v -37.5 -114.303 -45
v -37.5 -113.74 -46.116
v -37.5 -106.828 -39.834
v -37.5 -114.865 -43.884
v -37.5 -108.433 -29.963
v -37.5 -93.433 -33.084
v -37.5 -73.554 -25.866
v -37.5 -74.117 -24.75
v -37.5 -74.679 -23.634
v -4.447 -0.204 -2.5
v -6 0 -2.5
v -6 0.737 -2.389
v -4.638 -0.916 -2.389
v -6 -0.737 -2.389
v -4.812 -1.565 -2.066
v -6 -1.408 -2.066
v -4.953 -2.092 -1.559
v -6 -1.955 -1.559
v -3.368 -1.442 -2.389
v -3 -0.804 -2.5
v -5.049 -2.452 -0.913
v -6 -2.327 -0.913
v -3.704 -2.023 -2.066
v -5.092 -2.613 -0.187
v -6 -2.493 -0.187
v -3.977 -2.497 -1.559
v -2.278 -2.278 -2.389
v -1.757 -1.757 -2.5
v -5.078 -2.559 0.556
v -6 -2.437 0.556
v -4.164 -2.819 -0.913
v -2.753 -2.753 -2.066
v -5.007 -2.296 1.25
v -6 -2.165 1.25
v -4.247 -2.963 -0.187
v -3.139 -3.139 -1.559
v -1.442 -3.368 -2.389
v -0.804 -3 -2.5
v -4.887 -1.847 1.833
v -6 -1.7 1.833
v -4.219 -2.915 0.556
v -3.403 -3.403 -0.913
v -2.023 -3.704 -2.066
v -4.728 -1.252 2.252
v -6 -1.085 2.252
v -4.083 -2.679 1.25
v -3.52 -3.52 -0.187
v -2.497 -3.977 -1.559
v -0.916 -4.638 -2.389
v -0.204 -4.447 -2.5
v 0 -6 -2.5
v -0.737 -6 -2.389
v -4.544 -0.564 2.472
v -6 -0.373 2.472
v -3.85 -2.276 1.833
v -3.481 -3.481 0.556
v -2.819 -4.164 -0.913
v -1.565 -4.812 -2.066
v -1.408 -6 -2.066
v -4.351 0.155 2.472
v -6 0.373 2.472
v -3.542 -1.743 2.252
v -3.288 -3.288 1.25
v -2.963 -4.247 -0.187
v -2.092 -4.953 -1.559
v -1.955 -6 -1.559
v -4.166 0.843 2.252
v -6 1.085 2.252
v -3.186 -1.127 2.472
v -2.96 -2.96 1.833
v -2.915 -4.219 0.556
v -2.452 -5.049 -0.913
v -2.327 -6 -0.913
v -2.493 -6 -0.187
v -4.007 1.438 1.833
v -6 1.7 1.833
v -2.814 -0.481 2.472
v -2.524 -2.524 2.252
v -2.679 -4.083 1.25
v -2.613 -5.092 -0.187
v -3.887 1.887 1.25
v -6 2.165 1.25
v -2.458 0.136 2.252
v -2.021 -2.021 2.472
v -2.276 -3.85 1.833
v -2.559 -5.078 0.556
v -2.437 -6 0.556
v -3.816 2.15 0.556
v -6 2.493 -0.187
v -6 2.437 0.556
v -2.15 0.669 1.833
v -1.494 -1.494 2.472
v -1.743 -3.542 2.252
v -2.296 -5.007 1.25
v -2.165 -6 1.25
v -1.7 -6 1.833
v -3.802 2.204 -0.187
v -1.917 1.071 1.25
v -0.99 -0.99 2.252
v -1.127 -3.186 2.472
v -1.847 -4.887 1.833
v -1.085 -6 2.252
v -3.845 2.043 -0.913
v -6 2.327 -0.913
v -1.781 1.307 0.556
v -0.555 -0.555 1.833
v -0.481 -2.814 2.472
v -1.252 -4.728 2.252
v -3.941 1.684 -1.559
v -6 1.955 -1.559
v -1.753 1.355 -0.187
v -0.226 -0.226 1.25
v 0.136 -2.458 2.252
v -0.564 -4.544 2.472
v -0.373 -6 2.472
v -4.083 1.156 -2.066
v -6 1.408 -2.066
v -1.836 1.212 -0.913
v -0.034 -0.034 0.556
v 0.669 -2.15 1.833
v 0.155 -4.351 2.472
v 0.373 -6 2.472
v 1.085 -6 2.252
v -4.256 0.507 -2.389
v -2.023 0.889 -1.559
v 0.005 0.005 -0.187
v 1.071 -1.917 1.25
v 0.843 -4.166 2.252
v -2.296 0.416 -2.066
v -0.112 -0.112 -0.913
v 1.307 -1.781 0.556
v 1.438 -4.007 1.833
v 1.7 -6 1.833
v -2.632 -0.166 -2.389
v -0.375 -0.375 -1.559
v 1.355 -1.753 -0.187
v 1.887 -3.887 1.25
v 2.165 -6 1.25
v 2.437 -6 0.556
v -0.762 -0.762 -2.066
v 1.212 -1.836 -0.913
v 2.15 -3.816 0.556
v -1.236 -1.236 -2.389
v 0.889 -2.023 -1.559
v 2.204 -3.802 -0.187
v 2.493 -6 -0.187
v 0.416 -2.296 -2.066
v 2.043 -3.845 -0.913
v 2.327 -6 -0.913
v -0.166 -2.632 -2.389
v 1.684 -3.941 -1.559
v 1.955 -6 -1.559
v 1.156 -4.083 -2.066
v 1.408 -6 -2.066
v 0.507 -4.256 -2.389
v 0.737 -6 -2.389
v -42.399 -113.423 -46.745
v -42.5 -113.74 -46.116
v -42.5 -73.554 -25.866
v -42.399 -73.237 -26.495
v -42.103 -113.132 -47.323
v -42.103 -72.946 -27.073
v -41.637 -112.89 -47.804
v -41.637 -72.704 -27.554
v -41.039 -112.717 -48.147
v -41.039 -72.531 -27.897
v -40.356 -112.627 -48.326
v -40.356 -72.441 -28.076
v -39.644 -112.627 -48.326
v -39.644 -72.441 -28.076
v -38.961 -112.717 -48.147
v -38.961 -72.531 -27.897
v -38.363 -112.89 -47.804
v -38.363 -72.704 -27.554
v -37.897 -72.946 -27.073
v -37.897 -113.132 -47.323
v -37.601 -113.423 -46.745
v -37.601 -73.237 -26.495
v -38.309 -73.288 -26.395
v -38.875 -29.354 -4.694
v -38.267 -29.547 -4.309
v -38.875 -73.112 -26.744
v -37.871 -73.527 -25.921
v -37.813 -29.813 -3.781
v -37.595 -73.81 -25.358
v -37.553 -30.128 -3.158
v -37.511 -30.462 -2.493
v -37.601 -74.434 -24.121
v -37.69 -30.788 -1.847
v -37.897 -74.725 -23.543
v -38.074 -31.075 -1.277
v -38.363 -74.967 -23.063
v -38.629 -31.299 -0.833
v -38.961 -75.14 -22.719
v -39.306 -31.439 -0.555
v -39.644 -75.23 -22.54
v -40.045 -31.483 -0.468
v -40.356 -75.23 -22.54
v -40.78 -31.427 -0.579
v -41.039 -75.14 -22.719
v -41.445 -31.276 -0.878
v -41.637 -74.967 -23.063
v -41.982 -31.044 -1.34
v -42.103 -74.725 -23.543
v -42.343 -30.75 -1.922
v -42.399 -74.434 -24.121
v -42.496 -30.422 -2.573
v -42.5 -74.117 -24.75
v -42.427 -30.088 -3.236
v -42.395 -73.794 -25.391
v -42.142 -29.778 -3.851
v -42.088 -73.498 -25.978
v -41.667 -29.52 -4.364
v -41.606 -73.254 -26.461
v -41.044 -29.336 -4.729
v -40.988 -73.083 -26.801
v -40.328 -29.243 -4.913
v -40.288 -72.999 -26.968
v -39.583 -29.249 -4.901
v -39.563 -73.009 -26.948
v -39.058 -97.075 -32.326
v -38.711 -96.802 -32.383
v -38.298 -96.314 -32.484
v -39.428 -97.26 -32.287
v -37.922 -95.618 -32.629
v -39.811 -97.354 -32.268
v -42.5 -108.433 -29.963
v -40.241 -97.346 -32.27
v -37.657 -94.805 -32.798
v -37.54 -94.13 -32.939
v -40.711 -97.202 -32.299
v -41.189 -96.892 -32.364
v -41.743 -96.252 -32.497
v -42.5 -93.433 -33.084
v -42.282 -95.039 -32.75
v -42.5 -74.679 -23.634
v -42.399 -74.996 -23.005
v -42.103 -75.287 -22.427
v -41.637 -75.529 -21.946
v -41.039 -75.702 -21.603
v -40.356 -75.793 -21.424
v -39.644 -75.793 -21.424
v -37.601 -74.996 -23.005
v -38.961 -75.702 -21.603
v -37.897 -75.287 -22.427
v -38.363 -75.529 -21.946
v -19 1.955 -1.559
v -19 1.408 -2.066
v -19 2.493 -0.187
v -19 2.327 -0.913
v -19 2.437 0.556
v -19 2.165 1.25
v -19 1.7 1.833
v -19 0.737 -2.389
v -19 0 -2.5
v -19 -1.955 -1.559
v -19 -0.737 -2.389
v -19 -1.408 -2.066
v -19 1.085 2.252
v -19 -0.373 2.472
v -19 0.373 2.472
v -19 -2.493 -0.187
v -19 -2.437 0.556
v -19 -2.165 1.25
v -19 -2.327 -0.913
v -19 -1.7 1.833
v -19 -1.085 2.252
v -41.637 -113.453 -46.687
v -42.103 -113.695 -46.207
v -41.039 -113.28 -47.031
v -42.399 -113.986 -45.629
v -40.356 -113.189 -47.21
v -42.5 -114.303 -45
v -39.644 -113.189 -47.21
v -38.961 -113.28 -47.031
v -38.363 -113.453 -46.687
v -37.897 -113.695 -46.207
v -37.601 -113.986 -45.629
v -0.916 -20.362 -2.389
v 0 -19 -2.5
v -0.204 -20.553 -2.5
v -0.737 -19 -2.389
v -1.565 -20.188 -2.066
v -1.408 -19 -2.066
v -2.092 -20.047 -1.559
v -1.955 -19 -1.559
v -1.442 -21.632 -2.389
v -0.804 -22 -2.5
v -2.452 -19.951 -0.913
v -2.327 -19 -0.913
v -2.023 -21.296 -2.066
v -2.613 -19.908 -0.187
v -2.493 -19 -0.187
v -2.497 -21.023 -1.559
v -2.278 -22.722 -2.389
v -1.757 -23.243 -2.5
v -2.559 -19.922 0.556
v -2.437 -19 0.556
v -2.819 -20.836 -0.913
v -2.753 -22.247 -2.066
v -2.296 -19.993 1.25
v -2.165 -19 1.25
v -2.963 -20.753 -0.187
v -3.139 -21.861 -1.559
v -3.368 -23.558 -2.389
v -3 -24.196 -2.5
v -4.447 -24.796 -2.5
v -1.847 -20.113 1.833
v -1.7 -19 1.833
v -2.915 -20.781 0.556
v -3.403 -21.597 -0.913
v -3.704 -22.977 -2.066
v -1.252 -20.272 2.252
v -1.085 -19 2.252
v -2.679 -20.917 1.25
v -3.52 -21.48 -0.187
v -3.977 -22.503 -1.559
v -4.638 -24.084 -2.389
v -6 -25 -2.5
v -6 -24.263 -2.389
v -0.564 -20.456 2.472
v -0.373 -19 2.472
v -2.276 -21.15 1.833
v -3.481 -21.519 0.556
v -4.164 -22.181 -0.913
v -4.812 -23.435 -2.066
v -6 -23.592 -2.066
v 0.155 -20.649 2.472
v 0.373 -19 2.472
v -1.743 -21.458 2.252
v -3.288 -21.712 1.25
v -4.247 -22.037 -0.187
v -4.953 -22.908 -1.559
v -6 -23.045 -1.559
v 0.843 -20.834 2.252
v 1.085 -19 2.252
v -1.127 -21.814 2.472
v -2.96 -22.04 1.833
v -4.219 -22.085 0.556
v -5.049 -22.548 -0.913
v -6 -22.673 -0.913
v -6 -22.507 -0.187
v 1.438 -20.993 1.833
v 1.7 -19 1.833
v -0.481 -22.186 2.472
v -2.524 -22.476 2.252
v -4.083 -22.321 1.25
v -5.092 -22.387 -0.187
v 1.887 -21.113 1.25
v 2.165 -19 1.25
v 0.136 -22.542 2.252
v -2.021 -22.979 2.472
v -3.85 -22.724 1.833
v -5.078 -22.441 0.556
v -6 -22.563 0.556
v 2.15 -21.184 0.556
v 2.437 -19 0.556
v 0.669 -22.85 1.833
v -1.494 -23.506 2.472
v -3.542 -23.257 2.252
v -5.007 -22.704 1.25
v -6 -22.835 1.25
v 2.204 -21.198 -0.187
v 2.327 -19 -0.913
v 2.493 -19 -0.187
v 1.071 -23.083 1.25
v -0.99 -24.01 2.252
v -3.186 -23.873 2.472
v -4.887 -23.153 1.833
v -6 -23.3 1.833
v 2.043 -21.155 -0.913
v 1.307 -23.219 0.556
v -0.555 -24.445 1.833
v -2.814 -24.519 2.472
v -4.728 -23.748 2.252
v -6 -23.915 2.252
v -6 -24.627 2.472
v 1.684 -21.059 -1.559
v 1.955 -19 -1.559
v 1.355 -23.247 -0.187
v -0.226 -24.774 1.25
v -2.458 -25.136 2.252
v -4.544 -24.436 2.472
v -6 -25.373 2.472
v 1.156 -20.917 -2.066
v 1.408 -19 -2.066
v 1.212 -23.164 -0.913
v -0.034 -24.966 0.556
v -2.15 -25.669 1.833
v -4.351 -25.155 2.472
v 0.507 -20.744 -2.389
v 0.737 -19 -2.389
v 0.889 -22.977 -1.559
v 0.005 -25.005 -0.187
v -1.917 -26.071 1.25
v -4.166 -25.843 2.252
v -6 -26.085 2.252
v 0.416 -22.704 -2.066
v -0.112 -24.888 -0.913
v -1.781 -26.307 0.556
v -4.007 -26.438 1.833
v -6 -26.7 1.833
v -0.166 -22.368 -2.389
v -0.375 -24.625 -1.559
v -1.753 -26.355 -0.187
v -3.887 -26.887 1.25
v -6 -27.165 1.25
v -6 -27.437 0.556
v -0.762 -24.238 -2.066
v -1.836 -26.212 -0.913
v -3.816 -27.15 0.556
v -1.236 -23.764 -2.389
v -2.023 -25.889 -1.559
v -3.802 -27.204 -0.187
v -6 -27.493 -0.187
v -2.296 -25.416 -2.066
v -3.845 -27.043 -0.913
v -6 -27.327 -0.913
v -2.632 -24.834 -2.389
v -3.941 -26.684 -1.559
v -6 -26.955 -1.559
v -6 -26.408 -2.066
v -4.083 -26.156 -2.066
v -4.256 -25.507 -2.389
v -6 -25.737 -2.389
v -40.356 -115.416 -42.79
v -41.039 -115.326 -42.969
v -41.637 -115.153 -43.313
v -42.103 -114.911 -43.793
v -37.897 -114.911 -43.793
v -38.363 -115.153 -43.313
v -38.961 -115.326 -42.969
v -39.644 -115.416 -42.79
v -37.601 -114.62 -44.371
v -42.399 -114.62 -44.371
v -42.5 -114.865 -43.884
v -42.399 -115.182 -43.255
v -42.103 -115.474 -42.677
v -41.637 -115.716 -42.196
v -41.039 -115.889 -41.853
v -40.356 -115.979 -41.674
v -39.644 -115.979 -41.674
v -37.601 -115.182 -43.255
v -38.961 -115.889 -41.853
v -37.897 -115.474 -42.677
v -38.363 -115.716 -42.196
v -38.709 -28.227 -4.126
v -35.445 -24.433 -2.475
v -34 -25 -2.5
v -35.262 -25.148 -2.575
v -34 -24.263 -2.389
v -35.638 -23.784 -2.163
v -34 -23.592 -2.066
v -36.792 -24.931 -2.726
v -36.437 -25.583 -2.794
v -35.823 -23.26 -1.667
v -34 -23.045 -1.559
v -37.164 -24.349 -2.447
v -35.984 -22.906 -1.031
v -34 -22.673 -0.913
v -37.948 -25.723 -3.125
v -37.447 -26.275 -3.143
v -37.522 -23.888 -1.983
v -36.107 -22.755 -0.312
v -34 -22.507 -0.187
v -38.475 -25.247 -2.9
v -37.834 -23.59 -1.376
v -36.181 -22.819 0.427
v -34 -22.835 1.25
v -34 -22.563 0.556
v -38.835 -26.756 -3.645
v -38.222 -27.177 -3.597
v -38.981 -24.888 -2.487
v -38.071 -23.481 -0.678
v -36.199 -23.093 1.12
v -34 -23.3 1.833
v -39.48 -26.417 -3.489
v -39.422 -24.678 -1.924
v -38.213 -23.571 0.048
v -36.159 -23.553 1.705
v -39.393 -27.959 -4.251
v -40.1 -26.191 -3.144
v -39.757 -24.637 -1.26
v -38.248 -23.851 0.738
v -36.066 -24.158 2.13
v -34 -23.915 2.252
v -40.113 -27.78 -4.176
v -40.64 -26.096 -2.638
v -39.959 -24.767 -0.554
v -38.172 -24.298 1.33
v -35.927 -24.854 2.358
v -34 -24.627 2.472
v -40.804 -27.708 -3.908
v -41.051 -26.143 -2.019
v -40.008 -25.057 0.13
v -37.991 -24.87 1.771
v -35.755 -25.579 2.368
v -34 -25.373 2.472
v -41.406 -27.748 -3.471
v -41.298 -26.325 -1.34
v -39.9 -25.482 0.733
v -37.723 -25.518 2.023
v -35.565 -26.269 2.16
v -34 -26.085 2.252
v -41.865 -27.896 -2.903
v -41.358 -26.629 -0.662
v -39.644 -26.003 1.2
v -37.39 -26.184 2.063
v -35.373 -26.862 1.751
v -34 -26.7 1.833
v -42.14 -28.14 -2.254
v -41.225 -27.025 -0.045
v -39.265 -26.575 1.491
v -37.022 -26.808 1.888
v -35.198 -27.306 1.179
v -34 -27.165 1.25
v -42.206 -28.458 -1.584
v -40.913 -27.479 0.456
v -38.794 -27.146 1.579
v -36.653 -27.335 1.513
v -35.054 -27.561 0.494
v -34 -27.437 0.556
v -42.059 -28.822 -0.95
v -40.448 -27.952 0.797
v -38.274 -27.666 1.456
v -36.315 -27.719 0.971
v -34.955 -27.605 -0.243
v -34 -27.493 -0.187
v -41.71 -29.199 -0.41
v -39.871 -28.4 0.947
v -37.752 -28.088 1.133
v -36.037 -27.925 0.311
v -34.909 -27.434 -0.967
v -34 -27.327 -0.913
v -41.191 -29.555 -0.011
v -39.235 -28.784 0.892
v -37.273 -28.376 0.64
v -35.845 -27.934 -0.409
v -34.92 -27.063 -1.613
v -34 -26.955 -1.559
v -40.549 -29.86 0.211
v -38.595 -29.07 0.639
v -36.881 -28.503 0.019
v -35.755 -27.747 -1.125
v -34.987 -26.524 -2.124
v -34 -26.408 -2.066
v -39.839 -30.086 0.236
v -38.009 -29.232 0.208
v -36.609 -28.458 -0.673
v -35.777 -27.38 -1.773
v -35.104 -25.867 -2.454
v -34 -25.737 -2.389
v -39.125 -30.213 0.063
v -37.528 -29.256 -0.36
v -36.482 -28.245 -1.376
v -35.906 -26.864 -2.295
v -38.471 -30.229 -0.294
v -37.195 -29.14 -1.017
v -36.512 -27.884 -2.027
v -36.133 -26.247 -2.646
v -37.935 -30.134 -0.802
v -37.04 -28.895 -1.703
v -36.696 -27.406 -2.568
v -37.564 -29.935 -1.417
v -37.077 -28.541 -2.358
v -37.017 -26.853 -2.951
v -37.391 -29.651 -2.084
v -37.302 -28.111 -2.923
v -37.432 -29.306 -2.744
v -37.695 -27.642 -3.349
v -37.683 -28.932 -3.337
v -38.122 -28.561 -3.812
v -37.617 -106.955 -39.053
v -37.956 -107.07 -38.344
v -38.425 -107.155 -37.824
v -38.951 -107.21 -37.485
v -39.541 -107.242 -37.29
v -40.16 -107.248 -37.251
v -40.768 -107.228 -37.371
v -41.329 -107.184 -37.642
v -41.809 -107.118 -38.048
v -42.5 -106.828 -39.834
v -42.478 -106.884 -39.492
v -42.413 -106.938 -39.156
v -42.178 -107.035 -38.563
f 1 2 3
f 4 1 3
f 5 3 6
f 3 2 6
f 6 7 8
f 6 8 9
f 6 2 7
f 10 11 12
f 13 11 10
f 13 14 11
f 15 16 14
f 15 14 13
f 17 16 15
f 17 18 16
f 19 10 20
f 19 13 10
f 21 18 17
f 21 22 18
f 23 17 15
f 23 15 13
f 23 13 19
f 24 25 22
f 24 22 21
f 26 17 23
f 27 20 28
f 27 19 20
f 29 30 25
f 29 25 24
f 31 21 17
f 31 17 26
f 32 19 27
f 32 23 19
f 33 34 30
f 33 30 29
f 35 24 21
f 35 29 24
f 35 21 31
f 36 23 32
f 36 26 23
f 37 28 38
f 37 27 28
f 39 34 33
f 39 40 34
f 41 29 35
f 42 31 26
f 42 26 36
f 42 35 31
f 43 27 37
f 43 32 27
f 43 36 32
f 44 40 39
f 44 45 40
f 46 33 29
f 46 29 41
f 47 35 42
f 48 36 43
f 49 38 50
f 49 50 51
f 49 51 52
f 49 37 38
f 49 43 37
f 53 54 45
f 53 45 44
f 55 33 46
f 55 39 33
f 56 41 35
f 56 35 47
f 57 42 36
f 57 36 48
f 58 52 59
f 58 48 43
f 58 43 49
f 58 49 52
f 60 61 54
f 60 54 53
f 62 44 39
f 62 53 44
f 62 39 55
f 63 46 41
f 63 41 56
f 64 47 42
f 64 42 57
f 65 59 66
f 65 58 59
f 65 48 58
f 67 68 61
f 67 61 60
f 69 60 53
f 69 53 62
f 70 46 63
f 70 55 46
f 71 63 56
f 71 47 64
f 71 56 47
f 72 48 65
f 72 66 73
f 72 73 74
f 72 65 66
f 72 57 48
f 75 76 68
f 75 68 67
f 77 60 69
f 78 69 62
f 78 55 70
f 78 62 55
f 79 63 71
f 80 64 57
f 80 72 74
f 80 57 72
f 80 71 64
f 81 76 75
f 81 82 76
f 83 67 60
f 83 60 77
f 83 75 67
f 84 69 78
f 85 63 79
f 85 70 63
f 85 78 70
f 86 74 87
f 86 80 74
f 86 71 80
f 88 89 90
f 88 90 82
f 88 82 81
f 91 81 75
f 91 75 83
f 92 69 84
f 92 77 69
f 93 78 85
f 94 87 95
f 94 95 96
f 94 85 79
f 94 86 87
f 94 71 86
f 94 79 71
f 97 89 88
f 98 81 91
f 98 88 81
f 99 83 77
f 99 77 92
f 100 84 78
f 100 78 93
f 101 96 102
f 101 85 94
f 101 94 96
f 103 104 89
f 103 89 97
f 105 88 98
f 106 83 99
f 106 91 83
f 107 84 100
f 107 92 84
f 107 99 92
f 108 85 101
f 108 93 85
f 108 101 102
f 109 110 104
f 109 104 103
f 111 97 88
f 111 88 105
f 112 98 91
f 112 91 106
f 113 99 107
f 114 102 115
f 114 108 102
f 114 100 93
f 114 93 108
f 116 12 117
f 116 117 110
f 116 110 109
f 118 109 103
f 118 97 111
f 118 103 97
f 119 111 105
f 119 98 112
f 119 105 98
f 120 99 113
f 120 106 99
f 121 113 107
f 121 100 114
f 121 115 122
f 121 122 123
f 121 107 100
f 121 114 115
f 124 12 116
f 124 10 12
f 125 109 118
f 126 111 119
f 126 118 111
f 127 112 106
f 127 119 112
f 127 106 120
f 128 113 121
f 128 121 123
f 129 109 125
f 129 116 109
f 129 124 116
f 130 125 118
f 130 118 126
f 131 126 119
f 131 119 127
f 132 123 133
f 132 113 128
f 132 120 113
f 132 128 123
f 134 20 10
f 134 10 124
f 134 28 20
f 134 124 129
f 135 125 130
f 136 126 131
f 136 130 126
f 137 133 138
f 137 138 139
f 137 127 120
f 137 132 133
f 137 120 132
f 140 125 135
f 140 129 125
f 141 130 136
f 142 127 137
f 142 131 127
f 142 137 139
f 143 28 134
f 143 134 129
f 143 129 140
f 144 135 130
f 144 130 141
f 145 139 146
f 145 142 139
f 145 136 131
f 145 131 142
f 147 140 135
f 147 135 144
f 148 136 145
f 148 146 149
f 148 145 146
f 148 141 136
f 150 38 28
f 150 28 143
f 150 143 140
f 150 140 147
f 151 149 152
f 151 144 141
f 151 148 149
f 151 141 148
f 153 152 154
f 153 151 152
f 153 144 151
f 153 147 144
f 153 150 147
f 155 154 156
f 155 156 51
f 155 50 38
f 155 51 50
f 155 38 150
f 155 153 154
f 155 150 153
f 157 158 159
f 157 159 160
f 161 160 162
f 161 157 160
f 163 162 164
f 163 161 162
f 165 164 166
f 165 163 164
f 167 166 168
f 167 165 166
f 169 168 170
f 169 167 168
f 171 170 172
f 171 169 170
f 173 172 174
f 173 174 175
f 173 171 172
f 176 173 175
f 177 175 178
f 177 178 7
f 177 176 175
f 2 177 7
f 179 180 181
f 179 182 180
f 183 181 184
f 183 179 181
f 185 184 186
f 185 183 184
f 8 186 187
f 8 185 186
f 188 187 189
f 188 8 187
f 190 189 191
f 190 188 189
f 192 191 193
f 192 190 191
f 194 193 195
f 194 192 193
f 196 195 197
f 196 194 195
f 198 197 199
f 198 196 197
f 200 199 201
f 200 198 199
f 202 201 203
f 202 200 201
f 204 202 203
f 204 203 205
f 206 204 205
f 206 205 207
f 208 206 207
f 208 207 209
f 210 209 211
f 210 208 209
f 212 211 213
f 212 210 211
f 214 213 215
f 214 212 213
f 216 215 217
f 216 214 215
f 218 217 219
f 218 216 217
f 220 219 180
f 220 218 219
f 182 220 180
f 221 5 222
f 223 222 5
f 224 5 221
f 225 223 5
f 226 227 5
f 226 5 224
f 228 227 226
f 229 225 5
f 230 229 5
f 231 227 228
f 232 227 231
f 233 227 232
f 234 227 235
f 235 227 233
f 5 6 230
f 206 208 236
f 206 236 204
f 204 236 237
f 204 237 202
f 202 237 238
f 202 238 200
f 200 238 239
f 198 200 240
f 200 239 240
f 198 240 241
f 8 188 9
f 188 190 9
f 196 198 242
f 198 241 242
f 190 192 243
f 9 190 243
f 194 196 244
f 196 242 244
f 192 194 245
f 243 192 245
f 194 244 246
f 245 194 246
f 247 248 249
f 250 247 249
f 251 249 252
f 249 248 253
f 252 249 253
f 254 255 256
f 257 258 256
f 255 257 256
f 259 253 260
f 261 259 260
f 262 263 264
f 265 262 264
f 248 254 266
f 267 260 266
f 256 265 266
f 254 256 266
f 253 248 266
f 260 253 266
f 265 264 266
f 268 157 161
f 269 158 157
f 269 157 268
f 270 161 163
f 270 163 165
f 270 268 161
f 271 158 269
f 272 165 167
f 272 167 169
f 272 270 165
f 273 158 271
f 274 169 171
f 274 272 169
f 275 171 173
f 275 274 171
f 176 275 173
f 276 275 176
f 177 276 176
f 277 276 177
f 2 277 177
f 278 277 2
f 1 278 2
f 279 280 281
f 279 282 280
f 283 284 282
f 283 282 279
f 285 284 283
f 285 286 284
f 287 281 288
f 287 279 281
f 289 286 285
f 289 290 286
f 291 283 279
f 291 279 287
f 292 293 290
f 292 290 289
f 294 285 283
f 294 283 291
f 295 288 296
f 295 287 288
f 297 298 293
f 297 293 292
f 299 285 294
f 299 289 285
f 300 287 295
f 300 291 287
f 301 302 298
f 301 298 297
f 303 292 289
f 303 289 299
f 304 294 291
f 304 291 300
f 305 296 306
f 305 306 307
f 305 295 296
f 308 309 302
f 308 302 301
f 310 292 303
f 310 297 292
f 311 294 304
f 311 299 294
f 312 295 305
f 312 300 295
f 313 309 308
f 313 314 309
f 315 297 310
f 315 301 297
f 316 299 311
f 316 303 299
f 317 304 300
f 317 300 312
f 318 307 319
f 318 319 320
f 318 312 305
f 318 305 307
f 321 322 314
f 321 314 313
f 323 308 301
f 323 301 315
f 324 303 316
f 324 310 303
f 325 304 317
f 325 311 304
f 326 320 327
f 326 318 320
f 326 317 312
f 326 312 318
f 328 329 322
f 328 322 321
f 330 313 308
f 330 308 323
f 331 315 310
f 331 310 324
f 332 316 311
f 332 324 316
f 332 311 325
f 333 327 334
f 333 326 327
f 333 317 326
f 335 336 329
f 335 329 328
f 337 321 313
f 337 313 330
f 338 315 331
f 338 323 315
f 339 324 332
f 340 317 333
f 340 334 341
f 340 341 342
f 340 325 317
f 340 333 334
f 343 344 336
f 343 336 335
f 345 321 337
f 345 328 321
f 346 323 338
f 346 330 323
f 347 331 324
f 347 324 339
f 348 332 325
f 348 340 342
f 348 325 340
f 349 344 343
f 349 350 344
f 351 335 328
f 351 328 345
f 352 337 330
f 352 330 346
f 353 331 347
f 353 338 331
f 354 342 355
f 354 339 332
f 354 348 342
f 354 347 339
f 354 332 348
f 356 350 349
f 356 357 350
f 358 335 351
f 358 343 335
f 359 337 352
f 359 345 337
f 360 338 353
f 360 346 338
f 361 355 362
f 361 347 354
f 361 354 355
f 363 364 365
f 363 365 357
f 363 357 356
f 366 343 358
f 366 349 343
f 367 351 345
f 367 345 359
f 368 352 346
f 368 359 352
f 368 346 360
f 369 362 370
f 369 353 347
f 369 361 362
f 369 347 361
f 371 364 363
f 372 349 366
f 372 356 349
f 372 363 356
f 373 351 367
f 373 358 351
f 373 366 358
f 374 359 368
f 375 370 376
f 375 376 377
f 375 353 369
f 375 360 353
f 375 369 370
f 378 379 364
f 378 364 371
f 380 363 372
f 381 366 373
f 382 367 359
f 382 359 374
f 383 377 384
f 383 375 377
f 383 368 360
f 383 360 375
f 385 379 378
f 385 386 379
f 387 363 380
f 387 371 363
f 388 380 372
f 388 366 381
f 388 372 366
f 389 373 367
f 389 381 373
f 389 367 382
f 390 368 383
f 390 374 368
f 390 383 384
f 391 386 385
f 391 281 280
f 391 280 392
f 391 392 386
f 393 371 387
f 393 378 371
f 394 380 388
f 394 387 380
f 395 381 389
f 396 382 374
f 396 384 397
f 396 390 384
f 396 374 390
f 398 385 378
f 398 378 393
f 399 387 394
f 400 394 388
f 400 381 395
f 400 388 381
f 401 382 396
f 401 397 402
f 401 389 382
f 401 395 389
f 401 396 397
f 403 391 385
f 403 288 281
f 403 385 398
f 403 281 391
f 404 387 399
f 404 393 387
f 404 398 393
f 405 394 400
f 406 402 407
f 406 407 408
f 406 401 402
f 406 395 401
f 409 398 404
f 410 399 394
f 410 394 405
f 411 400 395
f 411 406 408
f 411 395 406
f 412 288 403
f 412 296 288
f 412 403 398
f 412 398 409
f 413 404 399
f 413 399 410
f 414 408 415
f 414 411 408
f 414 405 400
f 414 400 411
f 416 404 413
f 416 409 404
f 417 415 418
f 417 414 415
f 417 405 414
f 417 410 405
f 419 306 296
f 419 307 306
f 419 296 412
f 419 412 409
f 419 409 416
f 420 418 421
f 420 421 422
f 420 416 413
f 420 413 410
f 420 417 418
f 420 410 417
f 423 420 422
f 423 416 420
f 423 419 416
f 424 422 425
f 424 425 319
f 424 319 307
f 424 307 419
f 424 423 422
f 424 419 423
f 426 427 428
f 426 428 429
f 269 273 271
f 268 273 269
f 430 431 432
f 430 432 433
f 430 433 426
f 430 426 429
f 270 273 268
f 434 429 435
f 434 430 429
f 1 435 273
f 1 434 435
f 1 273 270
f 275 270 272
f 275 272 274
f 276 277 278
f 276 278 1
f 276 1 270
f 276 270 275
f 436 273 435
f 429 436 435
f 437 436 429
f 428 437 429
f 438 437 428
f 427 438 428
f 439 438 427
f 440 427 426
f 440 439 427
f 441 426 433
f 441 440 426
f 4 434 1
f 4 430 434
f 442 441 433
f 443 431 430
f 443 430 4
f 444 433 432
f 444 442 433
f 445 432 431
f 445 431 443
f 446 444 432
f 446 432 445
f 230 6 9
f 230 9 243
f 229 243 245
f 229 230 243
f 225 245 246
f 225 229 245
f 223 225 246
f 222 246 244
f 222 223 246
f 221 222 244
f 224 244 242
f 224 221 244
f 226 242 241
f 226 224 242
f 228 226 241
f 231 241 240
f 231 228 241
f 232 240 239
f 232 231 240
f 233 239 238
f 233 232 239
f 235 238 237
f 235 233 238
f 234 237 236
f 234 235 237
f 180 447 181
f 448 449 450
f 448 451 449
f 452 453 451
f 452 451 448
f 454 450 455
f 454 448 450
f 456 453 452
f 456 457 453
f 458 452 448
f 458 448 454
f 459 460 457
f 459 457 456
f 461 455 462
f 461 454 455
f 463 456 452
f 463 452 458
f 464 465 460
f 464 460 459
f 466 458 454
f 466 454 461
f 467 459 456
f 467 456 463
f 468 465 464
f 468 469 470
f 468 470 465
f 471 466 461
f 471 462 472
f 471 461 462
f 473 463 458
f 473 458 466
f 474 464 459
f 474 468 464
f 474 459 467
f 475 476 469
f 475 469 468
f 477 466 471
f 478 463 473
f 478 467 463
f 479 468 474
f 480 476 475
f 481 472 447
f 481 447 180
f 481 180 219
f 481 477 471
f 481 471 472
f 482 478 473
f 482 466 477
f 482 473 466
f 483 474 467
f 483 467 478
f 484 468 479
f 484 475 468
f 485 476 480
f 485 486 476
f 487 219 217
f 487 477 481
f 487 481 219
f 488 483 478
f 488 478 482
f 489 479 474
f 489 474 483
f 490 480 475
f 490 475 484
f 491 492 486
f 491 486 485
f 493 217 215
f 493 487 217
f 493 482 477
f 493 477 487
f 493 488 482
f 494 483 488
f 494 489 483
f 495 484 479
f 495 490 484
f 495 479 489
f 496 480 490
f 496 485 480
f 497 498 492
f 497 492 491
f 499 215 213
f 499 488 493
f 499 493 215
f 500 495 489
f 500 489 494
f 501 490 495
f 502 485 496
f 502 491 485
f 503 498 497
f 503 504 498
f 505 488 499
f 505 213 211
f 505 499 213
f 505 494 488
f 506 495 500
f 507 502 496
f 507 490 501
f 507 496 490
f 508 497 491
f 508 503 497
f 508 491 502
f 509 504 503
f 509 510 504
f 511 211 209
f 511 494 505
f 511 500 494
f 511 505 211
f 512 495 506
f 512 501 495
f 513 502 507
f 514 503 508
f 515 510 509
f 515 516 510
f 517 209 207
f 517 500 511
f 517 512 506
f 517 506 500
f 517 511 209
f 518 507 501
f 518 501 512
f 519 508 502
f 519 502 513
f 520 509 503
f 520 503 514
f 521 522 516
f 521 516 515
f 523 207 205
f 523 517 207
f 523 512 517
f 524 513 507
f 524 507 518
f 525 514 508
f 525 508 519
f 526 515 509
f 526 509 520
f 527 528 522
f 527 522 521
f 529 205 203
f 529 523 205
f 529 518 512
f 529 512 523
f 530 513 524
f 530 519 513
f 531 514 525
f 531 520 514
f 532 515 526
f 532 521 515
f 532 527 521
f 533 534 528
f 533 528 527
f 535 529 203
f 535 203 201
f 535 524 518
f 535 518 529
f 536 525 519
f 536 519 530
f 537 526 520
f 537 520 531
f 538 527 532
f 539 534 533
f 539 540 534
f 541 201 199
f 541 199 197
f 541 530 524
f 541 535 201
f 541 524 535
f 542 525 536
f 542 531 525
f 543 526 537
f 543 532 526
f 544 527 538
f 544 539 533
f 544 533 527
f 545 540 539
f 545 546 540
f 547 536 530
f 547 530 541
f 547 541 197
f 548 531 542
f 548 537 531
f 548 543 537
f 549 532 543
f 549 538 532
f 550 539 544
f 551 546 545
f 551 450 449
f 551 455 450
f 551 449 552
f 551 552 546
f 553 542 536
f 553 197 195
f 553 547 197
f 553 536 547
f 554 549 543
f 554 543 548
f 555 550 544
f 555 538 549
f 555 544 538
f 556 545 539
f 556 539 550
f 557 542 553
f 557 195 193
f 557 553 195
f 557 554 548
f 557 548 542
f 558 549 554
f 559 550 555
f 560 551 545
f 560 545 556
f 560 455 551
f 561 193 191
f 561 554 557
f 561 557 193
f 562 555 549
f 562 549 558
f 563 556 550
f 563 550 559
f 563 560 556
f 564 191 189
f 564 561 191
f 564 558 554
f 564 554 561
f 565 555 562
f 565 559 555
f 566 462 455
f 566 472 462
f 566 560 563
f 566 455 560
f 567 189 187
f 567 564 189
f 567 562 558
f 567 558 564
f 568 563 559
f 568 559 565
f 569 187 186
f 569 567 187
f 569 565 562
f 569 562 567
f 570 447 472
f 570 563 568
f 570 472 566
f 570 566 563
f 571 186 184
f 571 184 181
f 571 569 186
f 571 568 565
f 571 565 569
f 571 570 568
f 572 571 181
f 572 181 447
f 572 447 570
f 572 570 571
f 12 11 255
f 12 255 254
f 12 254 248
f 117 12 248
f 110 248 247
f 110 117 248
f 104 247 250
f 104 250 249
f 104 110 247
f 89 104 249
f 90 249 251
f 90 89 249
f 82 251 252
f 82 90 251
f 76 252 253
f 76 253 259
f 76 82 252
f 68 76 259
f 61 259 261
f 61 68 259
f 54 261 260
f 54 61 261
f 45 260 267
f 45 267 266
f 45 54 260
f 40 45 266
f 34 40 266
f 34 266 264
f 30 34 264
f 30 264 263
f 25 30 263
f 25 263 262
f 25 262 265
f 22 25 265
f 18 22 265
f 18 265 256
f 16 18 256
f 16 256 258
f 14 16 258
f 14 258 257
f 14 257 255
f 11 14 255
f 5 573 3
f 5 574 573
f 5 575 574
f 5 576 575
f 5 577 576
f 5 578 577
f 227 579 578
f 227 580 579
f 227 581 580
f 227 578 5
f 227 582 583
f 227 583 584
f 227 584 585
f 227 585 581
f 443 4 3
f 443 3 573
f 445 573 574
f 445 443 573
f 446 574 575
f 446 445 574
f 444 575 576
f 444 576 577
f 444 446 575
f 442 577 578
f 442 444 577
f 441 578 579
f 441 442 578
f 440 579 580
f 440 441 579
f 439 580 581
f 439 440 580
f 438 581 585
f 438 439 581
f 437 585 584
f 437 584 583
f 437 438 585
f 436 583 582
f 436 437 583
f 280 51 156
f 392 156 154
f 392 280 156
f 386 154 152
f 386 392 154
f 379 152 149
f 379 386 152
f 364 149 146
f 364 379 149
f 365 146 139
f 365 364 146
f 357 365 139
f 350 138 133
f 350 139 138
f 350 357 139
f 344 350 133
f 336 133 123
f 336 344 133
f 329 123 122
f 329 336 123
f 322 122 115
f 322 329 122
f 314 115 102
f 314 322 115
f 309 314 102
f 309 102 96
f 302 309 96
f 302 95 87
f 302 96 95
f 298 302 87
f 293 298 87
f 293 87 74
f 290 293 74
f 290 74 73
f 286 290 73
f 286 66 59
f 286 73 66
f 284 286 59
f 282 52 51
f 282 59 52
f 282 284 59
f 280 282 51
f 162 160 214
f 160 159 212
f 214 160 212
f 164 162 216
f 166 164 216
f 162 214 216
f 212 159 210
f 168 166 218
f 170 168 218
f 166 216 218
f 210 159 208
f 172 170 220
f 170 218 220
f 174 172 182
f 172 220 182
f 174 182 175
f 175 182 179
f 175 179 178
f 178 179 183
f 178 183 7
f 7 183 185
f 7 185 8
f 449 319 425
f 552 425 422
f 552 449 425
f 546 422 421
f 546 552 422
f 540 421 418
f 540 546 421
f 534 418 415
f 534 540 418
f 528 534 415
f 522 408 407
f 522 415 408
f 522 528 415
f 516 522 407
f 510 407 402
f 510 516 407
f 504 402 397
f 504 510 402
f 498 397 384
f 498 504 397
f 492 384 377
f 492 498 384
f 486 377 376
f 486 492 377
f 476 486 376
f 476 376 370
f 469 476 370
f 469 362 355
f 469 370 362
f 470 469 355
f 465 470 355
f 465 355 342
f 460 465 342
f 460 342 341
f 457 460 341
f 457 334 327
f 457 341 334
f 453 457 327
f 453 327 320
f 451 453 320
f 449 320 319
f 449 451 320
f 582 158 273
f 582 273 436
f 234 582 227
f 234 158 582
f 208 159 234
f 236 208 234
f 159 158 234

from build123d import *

# Parameters (mm, degrees)
SKETCH2_R           = 2.5
BOSS_EXTRUDE1_DEPTH = 45
BOSS_EXTRUDE2_DEPTH = 5


with BuildPart() as part:
    # Sweep1: sweep along a curve in space
    with BuildLine() as sweep1_path:
        Line((-40, -30.35817133, -2.7), (-40, -114.302855497, -45))
        ThreePointArc((-34, -25, 0), (-38.242640687, -26.569372048, -0.790811691), (-40, -30.35817133, -2.7))
        Line((-6, -25, 0), (-34, -25, 0))
        ThreePointArc((-6, -25, 0), (-1.757359313, -23.242640687, 0), (0, -19, 0))
        Line((0, -6, 0), (0, -19, 0))
        ThreePointArc((-6, 0, 0), (-1.757359313, -1.757359313, 0), (0, -6, 0))
        Line((-6, 0, 0), (-19, 0, 0))
    # Sketch2 → Sweep1 (sweep)
    with BuildSketch(Plane(origin=(-19, 0, 0), x_dir=(0, 0, -1), z_dir=(1, 0, 0))):
        Circle(SKETCH2_R)
    sweep(path=sweep1_path.line)

    # Sketch3 → Boss-Extrude1 (add)
    with BuildSketch(Plane(origin=(0, -109.240355497, -55.046571243), x_dir=(1, 0, 0), z_dir=(0, -0.8930285549745877, -0.45000000000000007))):
        with BuildLine():
            Line((-37.5, 11.25), (-37.5, 12.5))
            ThreePointArc((-37.5, 12.5), (-40, 15), (-42.5, 12.5))
            Line((-42.5, 12.5), (-42.5, 11.25))
            ThreePointArc((-42.5, 11.25), (-40, 13.75), (-37.5, 11.25))
        make_face()
        with BuildLine():
            ThreePointArc((-42.5, 11.25), (-40, 8.75), (-37.5, 11.25))
            ThreePointArc((-37.5, 11.25), (-40, 13.75), (-42.5, 11.25))
        make_face()
        with BuildLine():
            Line((-37.5, 10), (-37.5, 11.25))
            ThreePointArc((-37.5, 11.25), (-40, 8.75), (-42.5, 11.25))
            Line((-42.5, 11.25), (-42.5, 10))
            ThreePointArc((-42.5, 10), (-40, 7.5), (-37.5, 10))
        make_face()
    extrude(amount=-BOSS_EXTRUDE1_DEPTH)

    # Sketch4 → Boss-Extrude2 (add)
    with BuildSketch(Plane.ZY.offset(42.5)):
        Polygon((-39.833714306, -106.828098503), (-29.963286264, -108.432670178), (-33.083714306, -93.432670178), align=None)
    extrude(amount=-BOSS_EXTRUDE2_DEPTH)


solid = part.part
